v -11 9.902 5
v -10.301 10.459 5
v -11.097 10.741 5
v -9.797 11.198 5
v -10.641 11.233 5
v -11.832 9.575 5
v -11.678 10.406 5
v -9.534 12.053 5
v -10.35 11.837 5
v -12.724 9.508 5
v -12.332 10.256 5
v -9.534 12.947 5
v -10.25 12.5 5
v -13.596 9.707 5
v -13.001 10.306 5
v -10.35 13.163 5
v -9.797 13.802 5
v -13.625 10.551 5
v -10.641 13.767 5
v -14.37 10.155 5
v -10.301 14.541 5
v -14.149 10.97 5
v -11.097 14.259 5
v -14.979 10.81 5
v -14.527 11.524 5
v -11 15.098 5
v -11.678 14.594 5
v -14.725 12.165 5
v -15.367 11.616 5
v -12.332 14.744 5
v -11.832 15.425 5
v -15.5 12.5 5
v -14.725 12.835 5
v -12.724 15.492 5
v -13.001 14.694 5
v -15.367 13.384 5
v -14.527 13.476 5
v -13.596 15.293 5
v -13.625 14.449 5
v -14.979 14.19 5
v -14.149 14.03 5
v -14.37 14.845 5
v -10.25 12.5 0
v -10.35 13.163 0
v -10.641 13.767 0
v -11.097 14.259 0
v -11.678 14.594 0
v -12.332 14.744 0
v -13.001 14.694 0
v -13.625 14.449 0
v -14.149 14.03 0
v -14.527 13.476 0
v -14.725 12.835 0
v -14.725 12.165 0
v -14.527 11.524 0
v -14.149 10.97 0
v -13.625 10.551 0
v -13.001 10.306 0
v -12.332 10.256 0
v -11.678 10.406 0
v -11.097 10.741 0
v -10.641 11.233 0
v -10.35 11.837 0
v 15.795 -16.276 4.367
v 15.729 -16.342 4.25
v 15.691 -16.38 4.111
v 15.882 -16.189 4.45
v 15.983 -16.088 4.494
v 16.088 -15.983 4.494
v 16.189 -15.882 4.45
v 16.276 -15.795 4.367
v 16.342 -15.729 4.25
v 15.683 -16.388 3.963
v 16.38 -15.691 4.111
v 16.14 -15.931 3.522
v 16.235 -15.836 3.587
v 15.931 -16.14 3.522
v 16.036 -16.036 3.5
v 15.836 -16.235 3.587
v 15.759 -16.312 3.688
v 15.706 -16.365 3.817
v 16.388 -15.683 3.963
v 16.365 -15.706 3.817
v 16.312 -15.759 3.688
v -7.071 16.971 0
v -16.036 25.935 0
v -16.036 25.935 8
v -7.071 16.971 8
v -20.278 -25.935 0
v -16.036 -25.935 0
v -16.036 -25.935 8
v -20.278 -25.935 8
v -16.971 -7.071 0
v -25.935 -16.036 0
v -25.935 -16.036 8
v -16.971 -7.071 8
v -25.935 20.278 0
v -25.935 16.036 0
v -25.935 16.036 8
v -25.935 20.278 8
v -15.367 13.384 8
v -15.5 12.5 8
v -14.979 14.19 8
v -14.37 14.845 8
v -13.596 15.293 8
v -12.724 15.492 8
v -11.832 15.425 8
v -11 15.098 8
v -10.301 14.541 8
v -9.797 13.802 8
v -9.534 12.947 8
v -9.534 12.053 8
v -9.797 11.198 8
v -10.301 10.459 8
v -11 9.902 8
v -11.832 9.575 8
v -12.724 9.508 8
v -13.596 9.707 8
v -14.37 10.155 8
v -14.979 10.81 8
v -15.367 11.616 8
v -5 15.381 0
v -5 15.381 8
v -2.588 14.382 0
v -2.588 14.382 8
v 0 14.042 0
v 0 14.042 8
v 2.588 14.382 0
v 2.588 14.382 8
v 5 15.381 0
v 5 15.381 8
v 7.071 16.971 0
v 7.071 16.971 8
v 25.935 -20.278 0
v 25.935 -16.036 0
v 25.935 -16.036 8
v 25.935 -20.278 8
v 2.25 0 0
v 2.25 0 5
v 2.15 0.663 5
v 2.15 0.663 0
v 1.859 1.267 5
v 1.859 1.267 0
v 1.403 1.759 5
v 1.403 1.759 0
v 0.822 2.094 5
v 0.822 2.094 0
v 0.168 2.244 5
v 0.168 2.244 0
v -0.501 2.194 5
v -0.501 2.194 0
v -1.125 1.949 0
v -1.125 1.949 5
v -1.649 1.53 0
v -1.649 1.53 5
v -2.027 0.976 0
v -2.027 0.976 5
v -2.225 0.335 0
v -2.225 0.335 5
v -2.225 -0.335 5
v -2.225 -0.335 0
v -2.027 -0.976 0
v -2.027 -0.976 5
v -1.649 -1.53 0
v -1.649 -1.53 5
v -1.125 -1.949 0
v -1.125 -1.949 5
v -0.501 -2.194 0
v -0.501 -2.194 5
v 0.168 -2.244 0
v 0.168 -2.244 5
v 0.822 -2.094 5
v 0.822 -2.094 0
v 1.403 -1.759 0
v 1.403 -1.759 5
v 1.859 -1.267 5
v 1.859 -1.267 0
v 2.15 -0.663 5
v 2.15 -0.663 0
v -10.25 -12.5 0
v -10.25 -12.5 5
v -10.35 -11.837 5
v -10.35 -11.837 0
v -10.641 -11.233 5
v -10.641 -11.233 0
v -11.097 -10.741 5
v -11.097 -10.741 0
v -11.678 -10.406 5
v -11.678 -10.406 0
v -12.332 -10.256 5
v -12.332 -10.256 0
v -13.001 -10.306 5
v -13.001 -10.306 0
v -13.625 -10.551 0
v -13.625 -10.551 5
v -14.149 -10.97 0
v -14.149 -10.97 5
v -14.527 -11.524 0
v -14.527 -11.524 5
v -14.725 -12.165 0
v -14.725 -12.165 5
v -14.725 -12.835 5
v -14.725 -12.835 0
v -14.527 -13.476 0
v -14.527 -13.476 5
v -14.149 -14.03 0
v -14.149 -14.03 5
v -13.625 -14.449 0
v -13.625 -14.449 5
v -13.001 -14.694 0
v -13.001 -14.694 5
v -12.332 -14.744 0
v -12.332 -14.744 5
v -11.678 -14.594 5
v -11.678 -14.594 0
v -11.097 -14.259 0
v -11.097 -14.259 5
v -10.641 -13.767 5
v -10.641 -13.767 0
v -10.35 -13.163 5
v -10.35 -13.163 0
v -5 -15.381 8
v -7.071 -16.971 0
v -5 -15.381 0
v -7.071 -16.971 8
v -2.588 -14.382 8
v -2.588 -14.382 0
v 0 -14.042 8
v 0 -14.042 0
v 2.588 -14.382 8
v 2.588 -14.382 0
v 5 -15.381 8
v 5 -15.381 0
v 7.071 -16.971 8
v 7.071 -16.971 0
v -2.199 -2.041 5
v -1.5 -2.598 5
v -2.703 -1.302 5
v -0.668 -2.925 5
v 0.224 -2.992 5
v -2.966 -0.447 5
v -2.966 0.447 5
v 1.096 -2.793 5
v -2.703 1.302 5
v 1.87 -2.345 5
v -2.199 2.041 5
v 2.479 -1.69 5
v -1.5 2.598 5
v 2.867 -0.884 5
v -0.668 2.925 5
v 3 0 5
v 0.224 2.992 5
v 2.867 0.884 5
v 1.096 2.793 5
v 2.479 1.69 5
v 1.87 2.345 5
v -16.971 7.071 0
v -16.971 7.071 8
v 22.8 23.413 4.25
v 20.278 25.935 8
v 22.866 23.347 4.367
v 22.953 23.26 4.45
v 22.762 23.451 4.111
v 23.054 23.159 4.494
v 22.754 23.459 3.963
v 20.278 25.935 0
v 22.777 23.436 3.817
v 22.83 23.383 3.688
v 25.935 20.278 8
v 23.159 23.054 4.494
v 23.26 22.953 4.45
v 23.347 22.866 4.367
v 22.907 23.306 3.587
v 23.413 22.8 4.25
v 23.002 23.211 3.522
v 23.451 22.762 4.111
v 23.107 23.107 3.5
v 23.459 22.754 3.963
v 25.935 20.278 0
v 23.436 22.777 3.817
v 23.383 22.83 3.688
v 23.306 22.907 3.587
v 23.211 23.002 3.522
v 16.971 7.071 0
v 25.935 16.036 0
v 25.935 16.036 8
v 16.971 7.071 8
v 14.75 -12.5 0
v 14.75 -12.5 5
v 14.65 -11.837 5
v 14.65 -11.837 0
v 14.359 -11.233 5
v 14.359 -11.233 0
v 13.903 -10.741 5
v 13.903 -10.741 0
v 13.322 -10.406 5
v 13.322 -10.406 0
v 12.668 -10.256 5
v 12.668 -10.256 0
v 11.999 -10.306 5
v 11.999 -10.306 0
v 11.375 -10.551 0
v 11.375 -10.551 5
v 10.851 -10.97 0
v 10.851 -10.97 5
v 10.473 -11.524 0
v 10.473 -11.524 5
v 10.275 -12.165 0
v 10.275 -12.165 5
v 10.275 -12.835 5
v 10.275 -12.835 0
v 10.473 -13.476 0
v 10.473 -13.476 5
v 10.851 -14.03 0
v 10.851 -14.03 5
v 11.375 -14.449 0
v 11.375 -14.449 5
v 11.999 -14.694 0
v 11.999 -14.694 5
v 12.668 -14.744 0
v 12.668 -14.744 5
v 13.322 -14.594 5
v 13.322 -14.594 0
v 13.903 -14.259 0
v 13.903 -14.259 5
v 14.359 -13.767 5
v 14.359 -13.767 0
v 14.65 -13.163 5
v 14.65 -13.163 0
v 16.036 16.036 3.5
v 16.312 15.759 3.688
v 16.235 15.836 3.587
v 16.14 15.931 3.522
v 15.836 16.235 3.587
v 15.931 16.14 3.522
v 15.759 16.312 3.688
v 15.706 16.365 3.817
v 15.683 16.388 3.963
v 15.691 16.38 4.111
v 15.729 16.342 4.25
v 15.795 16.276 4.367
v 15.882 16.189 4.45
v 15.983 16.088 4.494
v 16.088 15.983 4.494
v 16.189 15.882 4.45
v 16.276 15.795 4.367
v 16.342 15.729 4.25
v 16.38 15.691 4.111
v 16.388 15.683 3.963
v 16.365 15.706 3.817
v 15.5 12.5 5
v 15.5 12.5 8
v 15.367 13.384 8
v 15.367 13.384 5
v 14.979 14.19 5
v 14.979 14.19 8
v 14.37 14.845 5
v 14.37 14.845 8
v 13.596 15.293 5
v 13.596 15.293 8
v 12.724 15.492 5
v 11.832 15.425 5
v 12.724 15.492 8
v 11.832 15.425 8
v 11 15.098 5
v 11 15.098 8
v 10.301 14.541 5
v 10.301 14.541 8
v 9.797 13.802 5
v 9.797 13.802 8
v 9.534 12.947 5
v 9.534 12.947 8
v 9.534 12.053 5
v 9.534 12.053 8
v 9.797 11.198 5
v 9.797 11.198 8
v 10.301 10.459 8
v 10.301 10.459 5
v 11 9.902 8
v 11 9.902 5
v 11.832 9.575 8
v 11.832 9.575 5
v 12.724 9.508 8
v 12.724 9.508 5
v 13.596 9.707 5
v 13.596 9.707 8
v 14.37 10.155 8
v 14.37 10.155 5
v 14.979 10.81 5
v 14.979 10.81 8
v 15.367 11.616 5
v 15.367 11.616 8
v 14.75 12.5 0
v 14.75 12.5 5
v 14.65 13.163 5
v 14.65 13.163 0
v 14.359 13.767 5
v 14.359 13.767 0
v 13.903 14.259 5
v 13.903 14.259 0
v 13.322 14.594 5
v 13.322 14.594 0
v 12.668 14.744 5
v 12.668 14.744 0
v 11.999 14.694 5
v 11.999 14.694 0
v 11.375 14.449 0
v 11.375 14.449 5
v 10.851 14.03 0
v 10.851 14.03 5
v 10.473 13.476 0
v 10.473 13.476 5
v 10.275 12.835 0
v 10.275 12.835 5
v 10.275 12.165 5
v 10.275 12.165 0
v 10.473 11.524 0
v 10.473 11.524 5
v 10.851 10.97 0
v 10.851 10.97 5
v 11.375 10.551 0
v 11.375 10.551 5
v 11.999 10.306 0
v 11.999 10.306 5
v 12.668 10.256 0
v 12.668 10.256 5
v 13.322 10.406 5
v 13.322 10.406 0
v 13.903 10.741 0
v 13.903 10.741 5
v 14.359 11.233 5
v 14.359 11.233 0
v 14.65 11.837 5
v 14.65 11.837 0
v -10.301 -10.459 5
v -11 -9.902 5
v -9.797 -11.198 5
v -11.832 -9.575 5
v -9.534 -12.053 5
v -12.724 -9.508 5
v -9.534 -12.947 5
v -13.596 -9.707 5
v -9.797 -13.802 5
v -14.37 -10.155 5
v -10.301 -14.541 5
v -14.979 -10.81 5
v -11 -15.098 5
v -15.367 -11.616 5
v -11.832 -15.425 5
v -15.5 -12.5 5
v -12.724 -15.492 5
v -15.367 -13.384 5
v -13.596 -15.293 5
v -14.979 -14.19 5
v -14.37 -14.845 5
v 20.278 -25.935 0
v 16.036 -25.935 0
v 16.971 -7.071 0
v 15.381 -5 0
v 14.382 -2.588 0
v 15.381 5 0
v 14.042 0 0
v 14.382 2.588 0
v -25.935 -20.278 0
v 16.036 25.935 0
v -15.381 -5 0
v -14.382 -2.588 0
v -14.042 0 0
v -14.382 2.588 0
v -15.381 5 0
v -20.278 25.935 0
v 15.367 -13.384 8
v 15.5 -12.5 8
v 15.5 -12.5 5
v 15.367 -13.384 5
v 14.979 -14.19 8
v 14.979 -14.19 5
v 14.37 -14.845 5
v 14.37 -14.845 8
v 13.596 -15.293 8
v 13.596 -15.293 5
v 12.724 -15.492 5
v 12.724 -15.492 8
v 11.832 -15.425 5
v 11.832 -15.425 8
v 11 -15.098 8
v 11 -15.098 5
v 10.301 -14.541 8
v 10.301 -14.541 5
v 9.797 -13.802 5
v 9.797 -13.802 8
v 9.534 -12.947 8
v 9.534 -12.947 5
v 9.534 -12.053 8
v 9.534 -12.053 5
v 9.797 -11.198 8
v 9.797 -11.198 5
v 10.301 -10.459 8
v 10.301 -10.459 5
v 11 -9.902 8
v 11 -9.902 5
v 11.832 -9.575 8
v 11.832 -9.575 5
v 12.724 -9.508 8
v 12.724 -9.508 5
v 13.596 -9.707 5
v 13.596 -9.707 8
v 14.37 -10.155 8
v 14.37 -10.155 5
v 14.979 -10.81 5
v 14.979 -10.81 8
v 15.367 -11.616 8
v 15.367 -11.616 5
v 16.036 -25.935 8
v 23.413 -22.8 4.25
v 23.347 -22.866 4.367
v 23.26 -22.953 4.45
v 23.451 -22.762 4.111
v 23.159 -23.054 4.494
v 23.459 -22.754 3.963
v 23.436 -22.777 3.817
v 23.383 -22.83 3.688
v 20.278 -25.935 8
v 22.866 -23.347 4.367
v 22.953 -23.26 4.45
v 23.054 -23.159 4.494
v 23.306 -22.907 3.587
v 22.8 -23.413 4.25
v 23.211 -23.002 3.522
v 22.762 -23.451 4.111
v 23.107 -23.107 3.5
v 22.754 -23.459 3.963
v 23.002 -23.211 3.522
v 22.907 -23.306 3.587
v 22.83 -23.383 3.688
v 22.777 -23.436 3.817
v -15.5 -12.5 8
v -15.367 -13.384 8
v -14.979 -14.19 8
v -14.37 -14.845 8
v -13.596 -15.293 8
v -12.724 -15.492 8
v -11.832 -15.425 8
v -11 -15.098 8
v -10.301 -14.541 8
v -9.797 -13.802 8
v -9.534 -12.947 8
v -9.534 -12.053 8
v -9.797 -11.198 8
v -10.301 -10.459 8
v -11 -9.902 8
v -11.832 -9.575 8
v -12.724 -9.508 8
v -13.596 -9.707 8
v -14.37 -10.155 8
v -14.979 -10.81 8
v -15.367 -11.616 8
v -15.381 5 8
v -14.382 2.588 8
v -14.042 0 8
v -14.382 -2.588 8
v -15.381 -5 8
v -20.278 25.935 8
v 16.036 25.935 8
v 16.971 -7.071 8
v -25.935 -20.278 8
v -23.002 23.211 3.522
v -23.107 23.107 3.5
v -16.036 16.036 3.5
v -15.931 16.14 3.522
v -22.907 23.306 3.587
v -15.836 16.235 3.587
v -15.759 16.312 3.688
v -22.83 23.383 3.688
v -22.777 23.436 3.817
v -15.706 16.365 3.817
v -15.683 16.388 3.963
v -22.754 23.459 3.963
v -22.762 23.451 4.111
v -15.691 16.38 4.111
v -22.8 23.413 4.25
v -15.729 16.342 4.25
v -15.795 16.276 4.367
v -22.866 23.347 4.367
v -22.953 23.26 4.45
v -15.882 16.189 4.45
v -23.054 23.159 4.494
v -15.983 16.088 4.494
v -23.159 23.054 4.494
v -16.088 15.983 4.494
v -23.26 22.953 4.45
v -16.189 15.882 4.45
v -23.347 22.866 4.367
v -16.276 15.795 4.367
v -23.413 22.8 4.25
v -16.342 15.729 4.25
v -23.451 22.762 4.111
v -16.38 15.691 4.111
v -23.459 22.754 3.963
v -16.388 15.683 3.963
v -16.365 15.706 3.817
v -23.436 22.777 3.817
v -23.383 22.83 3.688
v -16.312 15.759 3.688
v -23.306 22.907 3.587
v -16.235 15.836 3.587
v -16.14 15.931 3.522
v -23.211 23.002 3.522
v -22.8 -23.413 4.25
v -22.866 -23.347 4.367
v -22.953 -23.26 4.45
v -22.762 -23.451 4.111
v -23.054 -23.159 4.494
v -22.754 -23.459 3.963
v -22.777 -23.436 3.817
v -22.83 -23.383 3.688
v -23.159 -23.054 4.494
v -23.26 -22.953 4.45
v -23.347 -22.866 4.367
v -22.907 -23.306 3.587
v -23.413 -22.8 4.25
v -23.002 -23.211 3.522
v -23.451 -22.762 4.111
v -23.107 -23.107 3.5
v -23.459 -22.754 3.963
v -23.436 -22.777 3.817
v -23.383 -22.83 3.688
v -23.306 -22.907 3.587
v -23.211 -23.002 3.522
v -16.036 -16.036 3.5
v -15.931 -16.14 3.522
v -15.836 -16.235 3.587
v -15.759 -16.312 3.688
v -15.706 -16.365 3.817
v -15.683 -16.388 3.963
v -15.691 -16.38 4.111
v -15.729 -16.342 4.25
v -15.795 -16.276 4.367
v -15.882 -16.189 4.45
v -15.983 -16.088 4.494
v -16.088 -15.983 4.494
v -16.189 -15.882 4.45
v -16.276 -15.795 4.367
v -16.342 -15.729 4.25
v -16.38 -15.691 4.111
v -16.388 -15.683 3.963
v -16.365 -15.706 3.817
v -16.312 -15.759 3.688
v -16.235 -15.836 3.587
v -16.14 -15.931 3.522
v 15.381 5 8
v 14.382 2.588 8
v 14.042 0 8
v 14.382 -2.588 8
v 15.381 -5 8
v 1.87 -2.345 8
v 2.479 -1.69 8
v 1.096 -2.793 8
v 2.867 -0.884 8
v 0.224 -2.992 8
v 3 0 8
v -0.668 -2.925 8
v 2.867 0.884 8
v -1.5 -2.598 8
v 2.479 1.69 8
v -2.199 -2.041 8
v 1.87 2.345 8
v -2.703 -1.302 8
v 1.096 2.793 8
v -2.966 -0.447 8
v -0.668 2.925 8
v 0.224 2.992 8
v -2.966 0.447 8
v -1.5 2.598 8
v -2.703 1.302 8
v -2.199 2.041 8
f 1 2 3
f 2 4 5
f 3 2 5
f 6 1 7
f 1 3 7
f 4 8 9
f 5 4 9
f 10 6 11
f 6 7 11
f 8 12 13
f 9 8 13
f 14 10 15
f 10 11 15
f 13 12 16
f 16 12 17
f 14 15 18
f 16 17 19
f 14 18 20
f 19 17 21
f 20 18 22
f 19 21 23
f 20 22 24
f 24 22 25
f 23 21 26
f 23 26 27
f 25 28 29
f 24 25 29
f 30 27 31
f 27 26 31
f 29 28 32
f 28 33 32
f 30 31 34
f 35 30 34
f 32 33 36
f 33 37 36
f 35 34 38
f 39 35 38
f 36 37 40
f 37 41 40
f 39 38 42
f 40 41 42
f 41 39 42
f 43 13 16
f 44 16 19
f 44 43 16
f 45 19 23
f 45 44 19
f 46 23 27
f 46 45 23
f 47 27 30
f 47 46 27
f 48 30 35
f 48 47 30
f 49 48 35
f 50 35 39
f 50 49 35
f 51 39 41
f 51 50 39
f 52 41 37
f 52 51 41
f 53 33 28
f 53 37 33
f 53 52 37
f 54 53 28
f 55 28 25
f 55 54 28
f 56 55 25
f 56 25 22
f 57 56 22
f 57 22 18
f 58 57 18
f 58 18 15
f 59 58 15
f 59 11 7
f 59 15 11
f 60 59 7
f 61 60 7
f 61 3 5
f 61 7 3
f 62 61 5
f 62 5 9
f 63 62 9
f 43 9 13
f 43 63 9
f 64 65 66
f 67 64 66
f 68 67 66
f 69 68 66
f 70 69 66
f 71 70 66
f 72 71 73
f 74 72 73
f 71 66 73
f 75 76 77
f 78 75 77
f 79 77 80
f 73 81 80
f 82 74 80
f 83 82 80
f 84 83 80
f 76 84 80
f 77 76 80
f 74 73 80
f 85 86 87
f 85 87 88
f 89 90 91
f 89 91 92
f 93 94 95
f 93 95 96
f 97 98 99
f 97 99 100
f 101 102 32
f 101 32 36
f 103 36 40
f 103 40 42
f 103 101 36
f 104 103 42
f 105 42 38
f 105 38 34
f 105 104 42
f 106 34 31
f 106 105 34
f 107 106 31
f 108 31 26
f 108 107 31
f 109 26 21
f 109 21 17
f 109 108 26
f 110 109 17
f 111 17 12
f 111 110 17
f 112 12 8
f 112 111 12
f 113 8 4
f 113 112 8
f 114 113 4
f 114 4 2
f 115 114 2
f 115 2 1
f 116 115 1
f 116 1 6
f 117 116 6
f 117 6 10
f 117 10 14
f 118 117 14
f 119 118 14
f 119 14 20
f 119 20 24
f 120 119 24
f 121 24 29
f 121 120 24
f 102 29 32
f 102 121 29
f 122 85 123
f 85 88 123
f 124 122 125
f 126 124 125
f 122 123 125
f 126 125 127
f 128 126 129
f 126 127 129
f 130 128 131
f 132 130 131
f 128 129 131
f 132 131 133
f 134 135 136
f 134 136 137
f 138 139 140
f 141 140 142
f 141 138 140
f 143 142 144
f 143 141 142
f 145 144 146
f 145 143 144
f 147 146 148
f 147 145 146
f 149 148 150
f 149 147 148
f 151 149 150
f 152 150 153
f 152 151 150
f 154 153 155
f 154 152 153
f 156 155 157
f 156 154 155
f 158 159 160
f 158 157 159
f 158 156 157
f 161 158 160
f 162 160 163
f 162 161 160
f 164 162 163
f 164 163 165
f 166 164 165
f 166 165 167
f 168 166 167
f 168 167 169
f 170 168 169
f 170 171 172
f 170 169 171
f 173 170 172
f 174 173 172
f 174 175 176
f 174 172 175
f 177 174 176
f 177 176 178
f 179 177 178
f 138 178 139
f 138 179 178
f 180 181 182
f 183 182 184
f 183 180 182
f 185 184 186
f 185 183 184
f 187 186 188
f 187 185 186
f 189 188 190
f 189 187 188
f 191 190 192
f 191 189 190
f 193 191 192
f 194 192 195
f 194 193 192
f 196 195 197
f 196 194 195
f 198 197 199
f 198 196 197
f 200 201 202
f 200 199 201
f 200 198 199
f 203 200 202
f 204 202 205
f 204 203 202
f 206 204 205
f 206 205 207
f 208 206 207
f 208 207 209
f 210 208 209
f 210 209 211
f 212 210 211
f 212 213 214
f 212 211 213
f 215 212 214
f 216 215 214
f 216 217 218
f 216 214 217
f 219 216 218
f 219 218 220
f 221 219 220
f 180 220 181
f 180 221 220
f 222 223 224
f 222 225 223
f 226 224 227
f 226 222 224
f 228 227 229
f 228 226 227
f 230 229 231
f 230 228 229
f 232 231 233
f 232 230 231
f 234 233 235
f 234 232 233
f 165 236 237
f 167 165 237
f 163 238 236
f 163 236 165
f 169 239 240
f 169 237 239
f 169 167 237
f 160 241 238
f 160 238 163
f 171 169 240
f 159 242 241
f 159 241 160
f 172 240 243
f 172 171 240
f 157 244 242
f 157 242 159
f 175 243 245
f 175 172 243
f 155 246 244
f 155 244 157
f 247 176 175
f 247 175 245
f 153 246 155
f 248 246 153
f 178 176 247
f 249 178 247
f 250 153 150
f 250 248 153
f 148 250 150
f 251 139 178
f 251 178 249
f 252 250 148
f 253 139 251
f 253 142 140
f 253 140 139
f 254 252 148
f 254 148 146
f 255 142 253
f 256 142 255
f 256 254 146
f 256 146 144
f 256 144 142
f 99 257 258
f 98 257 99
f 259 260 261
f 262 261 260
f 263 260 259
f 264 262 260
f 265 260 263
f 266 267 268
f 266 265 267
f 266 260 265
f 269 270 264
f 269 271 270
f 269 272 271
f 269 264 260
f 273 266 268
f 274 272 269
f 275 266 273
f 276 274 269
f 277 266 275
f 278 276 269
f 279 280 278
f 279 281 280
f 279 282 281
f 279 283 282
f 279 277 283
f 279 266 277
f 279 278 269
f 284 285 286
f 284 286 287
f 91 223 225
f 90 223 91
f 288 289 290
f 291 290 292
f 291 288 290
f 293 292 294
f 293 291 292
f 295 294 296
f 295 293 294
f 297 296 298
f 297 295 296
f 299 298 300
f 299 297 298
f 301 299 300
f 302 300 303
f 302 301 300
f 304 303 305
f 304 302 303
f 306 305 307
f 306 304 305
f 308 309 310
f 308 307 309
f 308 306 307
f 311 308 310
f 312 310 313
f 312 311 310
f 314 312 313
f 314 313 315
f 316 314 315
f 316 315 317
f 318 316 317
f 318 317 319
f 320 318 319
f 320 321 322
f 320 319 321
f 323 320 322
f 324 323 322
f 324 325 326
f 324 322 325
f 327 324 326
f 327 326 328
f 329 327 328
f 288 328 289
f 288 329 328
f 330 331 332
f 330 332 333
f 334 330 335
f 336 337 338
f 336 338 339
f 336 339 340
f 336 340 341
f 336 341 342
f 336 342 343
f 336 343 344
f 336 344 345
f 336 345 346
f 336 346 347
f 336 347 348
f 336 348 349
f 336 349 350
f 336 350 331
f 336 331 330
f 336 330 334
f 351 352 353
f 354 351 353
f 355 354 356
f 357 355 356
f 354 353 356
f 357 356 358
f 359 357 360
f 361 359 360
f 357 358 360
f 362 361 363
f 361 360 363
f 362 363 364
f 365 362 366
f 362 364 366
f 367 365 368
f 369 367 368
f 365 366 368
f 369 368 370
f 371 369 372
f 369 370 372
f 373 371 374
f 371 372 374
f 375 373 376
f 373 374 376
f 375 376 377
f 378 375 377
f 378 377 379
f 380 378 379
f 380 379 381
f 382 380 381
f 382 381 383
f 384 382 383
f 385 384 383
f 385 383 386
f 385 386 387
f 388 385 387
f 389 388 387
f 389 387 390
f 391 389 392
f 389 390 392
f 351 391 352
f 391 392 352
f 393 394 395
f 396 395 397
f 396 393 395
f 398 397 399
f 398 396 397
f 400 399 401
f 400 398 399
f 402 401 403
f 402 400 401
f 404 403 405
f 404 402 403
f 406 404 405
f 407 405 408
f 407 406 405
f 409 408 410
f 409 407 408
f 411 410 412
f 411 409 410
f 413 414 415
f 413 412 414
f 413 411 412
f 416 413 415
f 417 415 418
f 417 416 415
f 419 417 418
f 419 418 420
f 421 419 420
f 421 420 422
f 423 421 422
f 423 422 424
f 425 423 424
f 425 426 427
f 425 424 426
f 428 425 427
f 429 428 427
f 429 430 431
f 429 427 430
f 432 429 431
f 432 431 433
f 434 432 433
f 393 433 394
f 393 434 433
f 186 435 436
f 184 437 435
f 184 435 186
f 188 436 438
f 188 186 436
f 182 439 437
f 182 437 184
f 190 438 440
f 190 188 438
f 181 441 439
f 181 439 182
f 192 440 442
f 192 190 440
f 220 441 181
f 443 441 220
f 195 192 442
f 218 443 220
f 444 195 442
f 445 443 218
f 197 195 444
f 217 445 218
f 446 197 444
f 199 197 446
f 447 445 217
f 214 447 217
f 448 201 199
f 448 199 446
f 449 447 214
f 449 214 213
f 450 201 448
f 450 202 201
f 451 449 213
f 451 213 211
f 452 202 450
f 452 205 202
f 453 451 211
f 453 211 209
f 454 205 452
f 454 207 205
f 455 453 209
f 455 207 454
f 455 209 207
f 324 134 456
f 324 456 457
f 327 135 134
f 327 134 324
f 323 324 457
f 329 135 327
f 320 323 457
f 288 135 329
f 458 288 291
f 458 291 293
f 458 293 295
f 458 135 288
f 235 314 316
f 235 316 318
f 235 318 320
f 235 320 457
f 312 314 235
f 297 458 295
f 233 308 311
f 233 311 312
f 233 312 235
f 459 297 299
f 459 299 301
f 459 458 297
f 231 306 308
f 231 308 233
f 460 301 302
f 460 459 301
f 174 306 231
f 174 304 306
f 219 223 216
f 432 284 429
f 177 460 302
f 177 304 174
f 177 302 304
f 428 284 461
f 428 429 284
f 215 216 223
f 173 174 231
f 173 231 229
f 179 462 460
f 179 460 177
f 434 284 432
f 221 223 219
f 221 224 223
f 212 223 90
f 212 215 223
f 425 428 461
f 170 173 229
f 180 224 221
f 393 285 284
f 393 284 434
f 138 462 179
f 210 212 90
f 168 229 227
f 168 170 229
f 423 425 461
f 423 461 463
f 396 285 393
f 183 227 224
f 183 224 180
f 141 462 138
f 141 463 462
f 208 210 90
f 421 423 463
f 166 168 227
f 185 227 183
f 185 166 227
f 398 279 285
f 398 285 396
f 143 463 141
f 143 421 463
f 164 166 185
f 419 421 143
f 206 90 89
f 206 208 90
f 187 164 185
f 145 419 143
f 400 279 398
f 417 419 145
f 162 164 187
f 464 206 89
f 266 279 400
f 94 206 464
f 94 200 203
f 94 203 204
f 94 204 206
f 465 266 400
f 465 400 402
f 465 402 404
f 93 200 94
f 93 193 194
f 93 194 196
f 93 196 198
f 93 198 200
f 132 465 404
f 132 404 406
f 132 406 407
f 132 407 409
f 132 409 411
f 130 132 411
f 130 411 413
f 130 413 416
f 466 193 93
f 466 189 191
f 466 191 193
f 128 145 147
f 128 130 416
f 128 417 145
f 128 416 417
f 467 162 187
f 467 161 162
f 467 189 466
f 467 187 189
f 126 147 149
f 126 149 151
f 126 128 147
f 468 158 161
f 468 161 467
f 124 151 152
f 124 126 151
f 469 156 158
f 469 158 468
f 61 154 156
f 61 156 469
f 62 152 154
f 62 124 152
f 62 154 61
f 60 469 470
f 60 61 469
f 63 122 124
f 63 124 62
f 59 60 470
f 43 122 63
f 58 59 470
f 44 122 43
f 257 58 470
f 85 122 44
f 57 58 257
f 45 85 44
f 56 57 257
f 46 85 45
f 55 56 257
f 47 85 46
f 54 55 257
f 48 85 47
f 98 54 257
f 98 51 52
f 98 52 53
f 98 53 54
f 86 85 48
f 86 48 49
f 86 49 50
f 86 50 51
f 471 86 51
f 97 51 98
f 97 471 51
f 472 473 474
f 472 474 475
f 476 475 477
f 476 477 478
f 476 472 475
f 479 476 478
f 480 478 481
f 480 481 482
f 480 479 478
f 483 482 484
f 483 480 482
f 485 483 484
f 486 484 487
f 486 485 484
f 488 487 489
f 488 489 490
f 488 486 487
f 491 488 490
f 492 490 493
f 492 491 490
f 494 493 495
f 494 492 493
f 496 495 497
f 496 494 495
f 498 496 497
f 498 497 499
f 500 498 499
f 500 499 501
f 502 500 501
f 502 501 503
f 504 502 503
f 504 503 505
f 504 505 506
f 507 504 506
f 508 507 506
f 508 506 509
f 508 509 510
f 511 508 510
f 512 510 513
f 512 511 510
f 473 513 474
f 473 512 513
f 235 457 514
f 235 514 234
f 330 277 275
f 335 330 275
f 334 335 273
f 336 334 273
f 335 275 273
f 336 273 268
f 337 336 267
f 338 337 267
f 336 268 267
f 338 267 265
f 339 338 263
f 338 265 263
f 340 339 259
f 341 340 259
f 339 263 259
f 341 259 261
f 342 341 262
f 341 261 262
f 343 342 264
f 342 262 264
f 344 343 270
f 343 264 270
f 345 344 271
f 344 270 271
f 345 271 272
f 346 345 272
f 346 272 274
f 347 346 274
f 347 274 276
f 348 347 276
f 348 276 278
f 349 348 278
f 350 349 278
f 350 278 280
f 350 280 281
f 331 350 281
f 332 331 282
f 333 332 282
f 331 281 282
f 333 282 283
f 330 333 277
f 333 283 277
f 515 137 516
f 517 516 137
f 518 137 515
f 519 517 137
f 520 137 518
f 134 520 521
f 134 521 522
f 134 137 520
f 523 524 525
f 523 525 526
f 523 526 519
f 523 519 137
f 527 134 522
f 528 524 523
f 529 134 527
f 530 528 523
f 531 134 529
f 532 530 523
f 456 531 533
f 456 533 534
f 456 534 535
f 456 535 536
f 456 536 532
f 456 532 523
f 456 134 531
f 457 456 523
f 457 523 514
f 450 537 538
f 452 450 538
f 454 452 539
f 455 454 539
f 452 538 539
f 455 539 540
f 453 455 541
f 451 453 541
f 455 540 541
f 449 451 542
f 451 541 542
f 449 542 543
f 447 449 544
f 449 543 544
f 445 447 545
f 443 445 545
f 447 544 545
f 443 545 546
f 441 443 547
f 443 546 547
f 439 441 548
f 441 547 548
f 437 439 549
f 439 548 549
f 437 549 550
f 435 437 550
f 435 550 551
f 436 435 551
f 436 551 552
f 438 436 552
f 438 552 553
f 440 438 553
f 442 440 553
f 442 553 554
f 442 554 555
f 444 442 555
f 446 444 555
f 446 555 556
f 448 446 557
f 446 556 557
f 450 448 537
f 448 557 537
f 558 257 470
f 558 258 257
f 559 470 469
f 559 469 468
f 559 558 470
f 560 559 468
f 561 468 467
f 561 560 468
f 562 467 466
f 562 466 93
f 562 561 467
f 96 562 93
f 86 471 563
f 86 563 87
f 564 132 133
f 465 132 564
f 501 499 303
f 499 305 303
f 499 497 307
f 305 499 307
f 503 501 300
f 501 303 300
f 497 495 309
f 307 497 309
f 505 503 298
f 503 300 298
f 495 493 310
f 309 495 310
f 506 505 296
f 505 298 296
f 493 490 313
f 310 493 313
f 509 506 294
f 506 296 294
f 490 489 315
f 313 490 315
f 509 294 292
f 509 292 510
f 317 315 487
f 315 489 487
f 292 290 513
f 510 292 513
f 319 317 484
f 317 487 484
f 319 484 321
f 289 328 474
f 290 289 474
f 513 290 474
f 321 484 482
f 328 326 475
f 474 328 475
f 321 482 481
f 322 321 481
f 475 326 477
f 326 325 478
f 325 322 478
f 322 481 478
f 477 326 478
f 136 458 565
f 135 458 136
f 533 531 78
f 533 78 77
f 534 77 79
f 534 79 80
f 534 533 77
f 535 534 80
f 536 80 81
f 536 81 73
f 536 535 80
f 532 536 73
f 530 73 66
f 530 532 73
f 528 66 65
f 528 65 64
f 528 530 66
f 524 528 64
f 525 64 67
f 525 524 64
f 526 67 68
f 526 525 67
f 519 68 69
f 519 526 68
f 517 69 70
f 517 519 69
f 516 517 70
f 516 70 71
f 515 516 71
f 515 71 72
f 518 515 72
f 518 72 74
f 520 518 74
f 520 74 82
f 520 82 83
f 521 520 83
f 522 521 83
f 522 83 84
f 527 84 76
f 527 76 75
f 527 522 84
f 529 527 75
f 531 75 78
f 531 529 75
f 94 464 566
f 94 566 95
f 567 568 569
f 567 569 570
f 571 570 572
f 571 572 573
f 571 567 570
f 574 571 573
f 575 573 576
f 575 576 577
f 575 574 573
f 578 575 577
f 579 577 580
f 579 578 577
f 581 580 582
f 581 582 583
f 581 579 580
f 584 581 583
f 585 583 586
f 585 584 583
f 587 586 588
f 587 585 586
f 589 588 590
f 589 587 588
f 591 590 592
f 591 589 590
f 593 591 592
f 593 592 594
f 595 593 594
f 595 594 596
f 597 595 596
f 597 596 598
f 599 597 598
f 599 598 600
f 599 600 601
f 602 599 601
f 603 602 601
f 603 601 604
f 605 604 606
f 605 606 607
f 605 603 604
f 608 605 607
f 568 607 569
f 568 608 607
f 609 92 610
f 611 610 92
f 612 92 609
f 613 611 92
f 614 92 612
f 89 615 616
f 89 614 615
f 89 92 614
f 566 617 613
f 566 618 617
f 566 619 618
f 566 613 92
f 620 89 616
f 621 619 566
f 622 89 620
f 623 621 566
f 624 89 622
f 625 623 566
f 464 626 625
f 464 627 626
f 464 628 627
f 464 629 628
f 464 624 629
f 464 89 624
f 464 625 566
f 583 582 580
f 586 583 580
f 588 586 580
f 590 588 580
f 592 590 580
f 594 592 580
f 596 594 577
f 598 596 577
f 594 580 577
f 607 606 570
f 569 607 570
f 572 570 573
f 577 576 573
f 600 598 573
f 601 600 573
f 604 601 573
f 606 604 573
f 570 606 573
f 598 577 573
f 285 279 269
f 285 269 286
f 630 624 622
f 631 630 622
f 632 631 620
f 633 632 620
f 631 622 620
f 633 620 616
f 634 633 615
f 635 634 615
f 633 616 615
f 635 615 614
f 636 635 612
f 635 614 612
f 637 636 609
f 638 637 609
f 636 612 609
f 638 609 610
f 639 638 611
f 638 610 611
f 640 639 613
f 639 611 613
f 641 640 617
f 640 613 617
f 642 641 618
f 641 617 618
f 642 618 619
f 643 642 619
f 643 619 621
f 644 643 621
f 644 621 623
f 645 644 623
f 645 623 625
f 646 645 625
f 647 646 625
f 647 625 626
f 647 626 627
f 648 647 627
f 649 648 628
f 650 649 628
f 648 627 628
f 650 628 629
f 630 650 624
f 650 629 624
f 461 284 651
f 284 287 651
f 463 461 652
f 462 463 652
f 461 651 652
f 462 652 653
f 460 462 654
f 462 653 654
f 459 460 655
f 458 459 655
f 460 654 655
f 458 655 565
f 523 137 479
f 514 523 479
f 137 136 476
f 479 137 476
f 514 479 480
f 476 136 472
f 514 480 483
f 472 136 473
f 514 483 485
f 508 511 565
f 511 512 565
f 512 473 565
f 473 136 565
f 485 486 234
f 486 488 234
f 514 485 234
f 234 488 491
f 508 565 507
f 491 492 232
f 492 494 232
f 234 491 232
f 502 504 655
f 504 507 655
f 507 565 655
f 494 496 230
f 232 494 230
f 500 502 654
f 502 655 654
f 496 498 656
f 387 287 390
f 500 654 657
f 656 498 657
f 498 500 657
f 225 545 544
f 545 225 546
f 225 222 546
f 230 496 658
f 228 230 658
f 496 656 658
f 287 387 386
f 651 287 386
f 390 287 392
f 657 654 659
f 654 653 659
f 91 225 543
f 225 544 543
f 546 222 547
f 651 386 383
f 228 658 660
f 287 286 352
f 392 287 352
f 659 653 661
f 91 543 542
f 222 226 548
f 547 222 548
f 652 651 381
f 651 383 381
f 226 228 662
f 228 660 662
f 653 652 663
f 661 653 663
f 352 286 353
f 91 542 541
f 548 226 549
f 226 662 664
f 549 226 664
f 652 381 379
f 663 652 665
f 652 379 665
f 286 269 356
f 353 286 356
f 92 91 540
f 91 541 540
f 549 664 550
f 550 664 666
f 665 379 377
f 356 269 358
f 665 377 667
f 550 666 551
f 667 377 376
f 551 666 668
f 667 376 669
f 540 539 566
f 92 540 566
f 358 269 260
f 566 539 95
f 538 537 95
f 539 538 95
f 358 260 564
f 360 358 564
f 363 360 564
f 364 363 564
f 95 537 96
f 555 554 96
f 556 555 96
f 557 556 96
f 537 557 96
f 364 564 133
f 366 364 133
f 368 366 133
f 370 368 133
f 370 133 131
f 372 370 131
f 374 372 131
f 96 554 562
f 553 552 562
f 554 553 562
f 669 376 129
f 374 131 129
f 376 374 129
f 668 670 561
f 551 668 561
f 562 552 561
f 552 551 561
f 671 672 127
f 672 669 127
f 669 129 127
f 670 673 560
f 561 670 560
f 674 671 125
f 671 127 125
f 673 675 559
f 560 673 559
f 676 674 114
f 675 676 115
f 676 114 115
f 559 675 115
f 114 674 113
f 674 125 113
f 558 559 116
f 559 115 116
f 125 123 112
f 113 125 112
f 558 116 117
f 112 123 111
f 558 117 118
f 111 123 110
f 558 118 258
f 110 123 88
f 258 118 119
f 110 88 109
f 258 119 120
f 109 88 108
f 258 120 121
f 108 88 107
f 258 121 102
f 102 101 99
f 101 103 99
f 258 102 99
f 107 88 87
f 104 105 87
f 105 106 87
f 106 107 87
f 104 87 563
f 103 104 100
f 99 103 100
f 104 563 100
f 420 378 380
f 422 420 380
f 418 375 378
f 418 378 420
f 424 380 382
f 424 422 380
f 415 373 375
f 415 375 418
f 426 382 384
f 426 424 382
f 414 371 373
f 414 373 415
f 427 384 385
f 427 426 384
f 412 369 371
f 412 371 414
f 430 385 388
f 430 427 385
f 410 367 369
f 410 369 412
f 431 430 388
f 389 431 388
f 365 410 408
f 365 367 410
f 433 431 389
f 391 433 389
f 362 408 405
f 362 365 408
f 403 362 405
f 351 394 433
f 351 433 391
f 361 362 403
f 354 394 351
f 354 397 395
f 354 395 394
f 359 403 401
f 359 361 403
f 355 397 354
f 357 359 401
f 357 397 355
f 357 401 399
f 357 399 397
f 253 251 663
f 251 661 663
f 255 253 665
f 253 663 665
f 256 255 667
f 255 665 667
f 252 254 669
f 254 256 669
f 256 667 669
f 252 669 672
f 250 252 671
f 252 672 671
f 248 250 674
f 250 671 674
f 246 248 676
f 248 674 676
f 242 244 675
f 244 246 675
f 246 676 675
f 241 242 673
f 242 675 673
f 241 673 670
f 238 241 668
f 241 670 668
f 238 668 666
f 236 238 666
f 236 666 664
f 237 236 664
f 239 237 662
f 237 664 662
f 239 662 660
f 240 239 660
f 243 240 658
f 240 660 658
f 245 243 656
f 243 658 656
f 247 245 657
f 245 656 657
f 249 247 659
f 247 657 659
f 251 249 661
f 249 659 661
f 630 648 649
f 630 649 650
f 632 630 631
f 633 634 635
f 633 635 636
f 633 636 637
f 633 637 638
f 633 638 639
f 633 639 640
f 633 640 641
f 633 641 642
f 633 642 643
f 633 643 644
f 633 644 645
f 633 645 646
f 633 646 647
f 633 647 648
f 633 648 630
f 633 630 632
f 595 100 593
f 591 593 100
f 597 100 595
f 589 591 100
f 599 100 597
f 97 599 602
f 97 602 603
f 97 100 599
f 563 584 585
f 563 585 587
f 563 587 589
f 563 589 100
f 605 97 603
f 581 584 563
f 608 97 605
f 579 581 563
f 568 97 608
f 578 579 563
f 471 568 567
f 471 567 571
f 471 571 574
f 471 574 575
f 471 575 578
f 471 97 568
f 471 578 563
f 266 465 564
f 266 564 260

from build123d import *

# Parameters (mm, degrees)
ESQUISSE1_R               = 2.25
BOSS_EXTRU_1_DEPTH        = 8
CONG_1_R                  = 10
ESQUISSE2_R               = 0.5
ENL_V_MAT_EXTRU_1_DEPTH   = 10
ESQUISSE3_R               = 3
ENL_V_MAT_EXTRU_2_DEPTH   = 3
SYM_TRIE2_COPY_1_SKETCH_R = 0.5
SYM_TRIE2_COPY_1_DEPTH    = 10
SYM_TRIE2_COPY_2_SKETCH_R = 3
SYM_TRIE2_COPY_2_DEPTH    = 3


with BuildPart() as part:
    # Esquisse1 → Boss.-Extru.1 (new body)
    with BuildSketch(Plane.XY):
        Polygon((-9.899494937, 0), (-25.935028843, 16.035533906), (-25.935028843, 20.278174593), (-20.278174593, 25.935028843), (-16.035533906, 25.935028843), (0, 9.899494937), (16.035533906, 25.935028843), (20.278174593, 25.935028843), (25.935028843, 20.278174593), (25.935028843, 16.035533906), (9.899494937, 0), (25.935028843, -16.035533906), (25.935028843, -20.278174593), (20.278174593, -25.935028843), (16.035533906, -25.935028843), (0, -9.899494937), (-16.035533906, -25.935028843), (-20.278174593, -25.935028843), (-25.935028843, -20.278174593), (-25.935028843, -16.035533906), align=None)
        with Locations((-12.5, -12.5)):
            Circle(ESQUISSE1_R, mode=Mode.SUBTRACT)
        with Locations((12.5, -12.5)):
            Circle(ESQUISSE1_R, mode=Mode.SUBTRACT)
        Circle(ESQUISSE1_R, mode=Mode.SUBTRACT)
        with Locations((12.5, 12.5)):
            Circle(ESQUISSE1_R, mode=Mode.SUBTRACT)
        with Locations((-12.5, 12.5)):
            Circle(ESQUISSE1_R, mode=Mode.SUBTRACT)
    extrude(amount=BOSS_EXTRU_1_DEPTH)

    # Congé1
    cong_1_edges = [part.edges().sort_by_distance(p)[0] for p in [
        (0, 9.899494937, 4),
        (9.899494937, 0, 4),
        (0, -9.899494937, 4),
        (-9.899494937, 0, 4),
    ]]
    fillet(cong_1_edges, radius=CONG_1_R)

    # Esquisse2 → Enlèv. mat.-Extru.1 (cut)
    with BuildSketch(Plane(origin=(23.106601718, 23.106601718, 0), x_dir=(0, 0, -1), z_dir=(0.707106781, 0.707106781, 0))):
        with Locations((-4, 0)):
            Circle(ESQUISSE2_R)
    enl_v_mat_extru_1 = extrude(amount=-ENL_V_MAT_EXTRU_1_DEPTH, mode=Mode.SUBTRACT)

    # Esquisse3 → Enlèv. mat.-Extru.2 (cut)
    with BuildSketch(Plane.XY.offset(8)):
        with Locations((12.5, 12.5)):
            Circle(ESQUISSE3_R)
        Circle(ESQUISSE3_R)
    enl_v_mat_extru_2 = extrude(amount=-ENL_V_MAT_EXTRU_2_DEPTH, mode=Mode.SUBTRACT)

    # Symétrie1: Enlèv. mat.-Extru.1, Enlèv. mat.-Extru.2 across plane
    add(enl_v_mat_extru_1.mirror(Plane.ZX), mode=Mode.SUBTRACT)
    add(enl_v_mat_extru_2.mirror(Plane.ZX), mode=Mode.SUBTRACT)

    # Symétrie2: Enlèv. mat.-Extru.1, Enlèv. mat.-Extru.2 across plane
    add(enl_v_mat_extru_1.mirror(Plane(origin=(0, 0, 0), x_dir=(0, 0, 1), z_dir=(1, 0, 0))), mode=Mode.SUBTRACT)
    add(enl_v_mat_extru_2.mirror(Plane(origin=(0, 0, 0), x_dir=(0, 0, 1), z_dir=(1, 0, 0))), mode=Mode.SUBTRACT)

    # Symétrie2 copy 1 sketch → Symétrie2 copy 1 (cut)
    with BuildSketch(Plane(origin=(-23.106601718, -23.106601718, 0), x_dir=(0, 0, -1), z_dir=(-0.707106781, -0.707106781, 0))):
        with Locations((-4, 0)):
            Circle(SYM_TRIE2_COPY_1_SKETCH_R)
    extrude(amount=-SYM_TRIE2_COPY_1_DEPTH, mode=Mode.SUBTRACT)

    # Symétrie2 copy 2 sketch → Symétrie2 copy 2 (cut)
    with BuildSketch(Plane(origin=(0, 0, 8), x_dir=(-1, 0, 0), z_dir=(0, 0, 1))):
        with Locations((12.5, 12.5)):
            Circle(SYM_TRIE2_COPY_2_SKETCH_R)
        Circle(SYM_TRIE2_COPY_2_SKETCH_R)
    extrude(amount=-SYM_TRIE2_COPY_2_DEPTH, mode=Mode.SUBTRACT)


solid = part.part
